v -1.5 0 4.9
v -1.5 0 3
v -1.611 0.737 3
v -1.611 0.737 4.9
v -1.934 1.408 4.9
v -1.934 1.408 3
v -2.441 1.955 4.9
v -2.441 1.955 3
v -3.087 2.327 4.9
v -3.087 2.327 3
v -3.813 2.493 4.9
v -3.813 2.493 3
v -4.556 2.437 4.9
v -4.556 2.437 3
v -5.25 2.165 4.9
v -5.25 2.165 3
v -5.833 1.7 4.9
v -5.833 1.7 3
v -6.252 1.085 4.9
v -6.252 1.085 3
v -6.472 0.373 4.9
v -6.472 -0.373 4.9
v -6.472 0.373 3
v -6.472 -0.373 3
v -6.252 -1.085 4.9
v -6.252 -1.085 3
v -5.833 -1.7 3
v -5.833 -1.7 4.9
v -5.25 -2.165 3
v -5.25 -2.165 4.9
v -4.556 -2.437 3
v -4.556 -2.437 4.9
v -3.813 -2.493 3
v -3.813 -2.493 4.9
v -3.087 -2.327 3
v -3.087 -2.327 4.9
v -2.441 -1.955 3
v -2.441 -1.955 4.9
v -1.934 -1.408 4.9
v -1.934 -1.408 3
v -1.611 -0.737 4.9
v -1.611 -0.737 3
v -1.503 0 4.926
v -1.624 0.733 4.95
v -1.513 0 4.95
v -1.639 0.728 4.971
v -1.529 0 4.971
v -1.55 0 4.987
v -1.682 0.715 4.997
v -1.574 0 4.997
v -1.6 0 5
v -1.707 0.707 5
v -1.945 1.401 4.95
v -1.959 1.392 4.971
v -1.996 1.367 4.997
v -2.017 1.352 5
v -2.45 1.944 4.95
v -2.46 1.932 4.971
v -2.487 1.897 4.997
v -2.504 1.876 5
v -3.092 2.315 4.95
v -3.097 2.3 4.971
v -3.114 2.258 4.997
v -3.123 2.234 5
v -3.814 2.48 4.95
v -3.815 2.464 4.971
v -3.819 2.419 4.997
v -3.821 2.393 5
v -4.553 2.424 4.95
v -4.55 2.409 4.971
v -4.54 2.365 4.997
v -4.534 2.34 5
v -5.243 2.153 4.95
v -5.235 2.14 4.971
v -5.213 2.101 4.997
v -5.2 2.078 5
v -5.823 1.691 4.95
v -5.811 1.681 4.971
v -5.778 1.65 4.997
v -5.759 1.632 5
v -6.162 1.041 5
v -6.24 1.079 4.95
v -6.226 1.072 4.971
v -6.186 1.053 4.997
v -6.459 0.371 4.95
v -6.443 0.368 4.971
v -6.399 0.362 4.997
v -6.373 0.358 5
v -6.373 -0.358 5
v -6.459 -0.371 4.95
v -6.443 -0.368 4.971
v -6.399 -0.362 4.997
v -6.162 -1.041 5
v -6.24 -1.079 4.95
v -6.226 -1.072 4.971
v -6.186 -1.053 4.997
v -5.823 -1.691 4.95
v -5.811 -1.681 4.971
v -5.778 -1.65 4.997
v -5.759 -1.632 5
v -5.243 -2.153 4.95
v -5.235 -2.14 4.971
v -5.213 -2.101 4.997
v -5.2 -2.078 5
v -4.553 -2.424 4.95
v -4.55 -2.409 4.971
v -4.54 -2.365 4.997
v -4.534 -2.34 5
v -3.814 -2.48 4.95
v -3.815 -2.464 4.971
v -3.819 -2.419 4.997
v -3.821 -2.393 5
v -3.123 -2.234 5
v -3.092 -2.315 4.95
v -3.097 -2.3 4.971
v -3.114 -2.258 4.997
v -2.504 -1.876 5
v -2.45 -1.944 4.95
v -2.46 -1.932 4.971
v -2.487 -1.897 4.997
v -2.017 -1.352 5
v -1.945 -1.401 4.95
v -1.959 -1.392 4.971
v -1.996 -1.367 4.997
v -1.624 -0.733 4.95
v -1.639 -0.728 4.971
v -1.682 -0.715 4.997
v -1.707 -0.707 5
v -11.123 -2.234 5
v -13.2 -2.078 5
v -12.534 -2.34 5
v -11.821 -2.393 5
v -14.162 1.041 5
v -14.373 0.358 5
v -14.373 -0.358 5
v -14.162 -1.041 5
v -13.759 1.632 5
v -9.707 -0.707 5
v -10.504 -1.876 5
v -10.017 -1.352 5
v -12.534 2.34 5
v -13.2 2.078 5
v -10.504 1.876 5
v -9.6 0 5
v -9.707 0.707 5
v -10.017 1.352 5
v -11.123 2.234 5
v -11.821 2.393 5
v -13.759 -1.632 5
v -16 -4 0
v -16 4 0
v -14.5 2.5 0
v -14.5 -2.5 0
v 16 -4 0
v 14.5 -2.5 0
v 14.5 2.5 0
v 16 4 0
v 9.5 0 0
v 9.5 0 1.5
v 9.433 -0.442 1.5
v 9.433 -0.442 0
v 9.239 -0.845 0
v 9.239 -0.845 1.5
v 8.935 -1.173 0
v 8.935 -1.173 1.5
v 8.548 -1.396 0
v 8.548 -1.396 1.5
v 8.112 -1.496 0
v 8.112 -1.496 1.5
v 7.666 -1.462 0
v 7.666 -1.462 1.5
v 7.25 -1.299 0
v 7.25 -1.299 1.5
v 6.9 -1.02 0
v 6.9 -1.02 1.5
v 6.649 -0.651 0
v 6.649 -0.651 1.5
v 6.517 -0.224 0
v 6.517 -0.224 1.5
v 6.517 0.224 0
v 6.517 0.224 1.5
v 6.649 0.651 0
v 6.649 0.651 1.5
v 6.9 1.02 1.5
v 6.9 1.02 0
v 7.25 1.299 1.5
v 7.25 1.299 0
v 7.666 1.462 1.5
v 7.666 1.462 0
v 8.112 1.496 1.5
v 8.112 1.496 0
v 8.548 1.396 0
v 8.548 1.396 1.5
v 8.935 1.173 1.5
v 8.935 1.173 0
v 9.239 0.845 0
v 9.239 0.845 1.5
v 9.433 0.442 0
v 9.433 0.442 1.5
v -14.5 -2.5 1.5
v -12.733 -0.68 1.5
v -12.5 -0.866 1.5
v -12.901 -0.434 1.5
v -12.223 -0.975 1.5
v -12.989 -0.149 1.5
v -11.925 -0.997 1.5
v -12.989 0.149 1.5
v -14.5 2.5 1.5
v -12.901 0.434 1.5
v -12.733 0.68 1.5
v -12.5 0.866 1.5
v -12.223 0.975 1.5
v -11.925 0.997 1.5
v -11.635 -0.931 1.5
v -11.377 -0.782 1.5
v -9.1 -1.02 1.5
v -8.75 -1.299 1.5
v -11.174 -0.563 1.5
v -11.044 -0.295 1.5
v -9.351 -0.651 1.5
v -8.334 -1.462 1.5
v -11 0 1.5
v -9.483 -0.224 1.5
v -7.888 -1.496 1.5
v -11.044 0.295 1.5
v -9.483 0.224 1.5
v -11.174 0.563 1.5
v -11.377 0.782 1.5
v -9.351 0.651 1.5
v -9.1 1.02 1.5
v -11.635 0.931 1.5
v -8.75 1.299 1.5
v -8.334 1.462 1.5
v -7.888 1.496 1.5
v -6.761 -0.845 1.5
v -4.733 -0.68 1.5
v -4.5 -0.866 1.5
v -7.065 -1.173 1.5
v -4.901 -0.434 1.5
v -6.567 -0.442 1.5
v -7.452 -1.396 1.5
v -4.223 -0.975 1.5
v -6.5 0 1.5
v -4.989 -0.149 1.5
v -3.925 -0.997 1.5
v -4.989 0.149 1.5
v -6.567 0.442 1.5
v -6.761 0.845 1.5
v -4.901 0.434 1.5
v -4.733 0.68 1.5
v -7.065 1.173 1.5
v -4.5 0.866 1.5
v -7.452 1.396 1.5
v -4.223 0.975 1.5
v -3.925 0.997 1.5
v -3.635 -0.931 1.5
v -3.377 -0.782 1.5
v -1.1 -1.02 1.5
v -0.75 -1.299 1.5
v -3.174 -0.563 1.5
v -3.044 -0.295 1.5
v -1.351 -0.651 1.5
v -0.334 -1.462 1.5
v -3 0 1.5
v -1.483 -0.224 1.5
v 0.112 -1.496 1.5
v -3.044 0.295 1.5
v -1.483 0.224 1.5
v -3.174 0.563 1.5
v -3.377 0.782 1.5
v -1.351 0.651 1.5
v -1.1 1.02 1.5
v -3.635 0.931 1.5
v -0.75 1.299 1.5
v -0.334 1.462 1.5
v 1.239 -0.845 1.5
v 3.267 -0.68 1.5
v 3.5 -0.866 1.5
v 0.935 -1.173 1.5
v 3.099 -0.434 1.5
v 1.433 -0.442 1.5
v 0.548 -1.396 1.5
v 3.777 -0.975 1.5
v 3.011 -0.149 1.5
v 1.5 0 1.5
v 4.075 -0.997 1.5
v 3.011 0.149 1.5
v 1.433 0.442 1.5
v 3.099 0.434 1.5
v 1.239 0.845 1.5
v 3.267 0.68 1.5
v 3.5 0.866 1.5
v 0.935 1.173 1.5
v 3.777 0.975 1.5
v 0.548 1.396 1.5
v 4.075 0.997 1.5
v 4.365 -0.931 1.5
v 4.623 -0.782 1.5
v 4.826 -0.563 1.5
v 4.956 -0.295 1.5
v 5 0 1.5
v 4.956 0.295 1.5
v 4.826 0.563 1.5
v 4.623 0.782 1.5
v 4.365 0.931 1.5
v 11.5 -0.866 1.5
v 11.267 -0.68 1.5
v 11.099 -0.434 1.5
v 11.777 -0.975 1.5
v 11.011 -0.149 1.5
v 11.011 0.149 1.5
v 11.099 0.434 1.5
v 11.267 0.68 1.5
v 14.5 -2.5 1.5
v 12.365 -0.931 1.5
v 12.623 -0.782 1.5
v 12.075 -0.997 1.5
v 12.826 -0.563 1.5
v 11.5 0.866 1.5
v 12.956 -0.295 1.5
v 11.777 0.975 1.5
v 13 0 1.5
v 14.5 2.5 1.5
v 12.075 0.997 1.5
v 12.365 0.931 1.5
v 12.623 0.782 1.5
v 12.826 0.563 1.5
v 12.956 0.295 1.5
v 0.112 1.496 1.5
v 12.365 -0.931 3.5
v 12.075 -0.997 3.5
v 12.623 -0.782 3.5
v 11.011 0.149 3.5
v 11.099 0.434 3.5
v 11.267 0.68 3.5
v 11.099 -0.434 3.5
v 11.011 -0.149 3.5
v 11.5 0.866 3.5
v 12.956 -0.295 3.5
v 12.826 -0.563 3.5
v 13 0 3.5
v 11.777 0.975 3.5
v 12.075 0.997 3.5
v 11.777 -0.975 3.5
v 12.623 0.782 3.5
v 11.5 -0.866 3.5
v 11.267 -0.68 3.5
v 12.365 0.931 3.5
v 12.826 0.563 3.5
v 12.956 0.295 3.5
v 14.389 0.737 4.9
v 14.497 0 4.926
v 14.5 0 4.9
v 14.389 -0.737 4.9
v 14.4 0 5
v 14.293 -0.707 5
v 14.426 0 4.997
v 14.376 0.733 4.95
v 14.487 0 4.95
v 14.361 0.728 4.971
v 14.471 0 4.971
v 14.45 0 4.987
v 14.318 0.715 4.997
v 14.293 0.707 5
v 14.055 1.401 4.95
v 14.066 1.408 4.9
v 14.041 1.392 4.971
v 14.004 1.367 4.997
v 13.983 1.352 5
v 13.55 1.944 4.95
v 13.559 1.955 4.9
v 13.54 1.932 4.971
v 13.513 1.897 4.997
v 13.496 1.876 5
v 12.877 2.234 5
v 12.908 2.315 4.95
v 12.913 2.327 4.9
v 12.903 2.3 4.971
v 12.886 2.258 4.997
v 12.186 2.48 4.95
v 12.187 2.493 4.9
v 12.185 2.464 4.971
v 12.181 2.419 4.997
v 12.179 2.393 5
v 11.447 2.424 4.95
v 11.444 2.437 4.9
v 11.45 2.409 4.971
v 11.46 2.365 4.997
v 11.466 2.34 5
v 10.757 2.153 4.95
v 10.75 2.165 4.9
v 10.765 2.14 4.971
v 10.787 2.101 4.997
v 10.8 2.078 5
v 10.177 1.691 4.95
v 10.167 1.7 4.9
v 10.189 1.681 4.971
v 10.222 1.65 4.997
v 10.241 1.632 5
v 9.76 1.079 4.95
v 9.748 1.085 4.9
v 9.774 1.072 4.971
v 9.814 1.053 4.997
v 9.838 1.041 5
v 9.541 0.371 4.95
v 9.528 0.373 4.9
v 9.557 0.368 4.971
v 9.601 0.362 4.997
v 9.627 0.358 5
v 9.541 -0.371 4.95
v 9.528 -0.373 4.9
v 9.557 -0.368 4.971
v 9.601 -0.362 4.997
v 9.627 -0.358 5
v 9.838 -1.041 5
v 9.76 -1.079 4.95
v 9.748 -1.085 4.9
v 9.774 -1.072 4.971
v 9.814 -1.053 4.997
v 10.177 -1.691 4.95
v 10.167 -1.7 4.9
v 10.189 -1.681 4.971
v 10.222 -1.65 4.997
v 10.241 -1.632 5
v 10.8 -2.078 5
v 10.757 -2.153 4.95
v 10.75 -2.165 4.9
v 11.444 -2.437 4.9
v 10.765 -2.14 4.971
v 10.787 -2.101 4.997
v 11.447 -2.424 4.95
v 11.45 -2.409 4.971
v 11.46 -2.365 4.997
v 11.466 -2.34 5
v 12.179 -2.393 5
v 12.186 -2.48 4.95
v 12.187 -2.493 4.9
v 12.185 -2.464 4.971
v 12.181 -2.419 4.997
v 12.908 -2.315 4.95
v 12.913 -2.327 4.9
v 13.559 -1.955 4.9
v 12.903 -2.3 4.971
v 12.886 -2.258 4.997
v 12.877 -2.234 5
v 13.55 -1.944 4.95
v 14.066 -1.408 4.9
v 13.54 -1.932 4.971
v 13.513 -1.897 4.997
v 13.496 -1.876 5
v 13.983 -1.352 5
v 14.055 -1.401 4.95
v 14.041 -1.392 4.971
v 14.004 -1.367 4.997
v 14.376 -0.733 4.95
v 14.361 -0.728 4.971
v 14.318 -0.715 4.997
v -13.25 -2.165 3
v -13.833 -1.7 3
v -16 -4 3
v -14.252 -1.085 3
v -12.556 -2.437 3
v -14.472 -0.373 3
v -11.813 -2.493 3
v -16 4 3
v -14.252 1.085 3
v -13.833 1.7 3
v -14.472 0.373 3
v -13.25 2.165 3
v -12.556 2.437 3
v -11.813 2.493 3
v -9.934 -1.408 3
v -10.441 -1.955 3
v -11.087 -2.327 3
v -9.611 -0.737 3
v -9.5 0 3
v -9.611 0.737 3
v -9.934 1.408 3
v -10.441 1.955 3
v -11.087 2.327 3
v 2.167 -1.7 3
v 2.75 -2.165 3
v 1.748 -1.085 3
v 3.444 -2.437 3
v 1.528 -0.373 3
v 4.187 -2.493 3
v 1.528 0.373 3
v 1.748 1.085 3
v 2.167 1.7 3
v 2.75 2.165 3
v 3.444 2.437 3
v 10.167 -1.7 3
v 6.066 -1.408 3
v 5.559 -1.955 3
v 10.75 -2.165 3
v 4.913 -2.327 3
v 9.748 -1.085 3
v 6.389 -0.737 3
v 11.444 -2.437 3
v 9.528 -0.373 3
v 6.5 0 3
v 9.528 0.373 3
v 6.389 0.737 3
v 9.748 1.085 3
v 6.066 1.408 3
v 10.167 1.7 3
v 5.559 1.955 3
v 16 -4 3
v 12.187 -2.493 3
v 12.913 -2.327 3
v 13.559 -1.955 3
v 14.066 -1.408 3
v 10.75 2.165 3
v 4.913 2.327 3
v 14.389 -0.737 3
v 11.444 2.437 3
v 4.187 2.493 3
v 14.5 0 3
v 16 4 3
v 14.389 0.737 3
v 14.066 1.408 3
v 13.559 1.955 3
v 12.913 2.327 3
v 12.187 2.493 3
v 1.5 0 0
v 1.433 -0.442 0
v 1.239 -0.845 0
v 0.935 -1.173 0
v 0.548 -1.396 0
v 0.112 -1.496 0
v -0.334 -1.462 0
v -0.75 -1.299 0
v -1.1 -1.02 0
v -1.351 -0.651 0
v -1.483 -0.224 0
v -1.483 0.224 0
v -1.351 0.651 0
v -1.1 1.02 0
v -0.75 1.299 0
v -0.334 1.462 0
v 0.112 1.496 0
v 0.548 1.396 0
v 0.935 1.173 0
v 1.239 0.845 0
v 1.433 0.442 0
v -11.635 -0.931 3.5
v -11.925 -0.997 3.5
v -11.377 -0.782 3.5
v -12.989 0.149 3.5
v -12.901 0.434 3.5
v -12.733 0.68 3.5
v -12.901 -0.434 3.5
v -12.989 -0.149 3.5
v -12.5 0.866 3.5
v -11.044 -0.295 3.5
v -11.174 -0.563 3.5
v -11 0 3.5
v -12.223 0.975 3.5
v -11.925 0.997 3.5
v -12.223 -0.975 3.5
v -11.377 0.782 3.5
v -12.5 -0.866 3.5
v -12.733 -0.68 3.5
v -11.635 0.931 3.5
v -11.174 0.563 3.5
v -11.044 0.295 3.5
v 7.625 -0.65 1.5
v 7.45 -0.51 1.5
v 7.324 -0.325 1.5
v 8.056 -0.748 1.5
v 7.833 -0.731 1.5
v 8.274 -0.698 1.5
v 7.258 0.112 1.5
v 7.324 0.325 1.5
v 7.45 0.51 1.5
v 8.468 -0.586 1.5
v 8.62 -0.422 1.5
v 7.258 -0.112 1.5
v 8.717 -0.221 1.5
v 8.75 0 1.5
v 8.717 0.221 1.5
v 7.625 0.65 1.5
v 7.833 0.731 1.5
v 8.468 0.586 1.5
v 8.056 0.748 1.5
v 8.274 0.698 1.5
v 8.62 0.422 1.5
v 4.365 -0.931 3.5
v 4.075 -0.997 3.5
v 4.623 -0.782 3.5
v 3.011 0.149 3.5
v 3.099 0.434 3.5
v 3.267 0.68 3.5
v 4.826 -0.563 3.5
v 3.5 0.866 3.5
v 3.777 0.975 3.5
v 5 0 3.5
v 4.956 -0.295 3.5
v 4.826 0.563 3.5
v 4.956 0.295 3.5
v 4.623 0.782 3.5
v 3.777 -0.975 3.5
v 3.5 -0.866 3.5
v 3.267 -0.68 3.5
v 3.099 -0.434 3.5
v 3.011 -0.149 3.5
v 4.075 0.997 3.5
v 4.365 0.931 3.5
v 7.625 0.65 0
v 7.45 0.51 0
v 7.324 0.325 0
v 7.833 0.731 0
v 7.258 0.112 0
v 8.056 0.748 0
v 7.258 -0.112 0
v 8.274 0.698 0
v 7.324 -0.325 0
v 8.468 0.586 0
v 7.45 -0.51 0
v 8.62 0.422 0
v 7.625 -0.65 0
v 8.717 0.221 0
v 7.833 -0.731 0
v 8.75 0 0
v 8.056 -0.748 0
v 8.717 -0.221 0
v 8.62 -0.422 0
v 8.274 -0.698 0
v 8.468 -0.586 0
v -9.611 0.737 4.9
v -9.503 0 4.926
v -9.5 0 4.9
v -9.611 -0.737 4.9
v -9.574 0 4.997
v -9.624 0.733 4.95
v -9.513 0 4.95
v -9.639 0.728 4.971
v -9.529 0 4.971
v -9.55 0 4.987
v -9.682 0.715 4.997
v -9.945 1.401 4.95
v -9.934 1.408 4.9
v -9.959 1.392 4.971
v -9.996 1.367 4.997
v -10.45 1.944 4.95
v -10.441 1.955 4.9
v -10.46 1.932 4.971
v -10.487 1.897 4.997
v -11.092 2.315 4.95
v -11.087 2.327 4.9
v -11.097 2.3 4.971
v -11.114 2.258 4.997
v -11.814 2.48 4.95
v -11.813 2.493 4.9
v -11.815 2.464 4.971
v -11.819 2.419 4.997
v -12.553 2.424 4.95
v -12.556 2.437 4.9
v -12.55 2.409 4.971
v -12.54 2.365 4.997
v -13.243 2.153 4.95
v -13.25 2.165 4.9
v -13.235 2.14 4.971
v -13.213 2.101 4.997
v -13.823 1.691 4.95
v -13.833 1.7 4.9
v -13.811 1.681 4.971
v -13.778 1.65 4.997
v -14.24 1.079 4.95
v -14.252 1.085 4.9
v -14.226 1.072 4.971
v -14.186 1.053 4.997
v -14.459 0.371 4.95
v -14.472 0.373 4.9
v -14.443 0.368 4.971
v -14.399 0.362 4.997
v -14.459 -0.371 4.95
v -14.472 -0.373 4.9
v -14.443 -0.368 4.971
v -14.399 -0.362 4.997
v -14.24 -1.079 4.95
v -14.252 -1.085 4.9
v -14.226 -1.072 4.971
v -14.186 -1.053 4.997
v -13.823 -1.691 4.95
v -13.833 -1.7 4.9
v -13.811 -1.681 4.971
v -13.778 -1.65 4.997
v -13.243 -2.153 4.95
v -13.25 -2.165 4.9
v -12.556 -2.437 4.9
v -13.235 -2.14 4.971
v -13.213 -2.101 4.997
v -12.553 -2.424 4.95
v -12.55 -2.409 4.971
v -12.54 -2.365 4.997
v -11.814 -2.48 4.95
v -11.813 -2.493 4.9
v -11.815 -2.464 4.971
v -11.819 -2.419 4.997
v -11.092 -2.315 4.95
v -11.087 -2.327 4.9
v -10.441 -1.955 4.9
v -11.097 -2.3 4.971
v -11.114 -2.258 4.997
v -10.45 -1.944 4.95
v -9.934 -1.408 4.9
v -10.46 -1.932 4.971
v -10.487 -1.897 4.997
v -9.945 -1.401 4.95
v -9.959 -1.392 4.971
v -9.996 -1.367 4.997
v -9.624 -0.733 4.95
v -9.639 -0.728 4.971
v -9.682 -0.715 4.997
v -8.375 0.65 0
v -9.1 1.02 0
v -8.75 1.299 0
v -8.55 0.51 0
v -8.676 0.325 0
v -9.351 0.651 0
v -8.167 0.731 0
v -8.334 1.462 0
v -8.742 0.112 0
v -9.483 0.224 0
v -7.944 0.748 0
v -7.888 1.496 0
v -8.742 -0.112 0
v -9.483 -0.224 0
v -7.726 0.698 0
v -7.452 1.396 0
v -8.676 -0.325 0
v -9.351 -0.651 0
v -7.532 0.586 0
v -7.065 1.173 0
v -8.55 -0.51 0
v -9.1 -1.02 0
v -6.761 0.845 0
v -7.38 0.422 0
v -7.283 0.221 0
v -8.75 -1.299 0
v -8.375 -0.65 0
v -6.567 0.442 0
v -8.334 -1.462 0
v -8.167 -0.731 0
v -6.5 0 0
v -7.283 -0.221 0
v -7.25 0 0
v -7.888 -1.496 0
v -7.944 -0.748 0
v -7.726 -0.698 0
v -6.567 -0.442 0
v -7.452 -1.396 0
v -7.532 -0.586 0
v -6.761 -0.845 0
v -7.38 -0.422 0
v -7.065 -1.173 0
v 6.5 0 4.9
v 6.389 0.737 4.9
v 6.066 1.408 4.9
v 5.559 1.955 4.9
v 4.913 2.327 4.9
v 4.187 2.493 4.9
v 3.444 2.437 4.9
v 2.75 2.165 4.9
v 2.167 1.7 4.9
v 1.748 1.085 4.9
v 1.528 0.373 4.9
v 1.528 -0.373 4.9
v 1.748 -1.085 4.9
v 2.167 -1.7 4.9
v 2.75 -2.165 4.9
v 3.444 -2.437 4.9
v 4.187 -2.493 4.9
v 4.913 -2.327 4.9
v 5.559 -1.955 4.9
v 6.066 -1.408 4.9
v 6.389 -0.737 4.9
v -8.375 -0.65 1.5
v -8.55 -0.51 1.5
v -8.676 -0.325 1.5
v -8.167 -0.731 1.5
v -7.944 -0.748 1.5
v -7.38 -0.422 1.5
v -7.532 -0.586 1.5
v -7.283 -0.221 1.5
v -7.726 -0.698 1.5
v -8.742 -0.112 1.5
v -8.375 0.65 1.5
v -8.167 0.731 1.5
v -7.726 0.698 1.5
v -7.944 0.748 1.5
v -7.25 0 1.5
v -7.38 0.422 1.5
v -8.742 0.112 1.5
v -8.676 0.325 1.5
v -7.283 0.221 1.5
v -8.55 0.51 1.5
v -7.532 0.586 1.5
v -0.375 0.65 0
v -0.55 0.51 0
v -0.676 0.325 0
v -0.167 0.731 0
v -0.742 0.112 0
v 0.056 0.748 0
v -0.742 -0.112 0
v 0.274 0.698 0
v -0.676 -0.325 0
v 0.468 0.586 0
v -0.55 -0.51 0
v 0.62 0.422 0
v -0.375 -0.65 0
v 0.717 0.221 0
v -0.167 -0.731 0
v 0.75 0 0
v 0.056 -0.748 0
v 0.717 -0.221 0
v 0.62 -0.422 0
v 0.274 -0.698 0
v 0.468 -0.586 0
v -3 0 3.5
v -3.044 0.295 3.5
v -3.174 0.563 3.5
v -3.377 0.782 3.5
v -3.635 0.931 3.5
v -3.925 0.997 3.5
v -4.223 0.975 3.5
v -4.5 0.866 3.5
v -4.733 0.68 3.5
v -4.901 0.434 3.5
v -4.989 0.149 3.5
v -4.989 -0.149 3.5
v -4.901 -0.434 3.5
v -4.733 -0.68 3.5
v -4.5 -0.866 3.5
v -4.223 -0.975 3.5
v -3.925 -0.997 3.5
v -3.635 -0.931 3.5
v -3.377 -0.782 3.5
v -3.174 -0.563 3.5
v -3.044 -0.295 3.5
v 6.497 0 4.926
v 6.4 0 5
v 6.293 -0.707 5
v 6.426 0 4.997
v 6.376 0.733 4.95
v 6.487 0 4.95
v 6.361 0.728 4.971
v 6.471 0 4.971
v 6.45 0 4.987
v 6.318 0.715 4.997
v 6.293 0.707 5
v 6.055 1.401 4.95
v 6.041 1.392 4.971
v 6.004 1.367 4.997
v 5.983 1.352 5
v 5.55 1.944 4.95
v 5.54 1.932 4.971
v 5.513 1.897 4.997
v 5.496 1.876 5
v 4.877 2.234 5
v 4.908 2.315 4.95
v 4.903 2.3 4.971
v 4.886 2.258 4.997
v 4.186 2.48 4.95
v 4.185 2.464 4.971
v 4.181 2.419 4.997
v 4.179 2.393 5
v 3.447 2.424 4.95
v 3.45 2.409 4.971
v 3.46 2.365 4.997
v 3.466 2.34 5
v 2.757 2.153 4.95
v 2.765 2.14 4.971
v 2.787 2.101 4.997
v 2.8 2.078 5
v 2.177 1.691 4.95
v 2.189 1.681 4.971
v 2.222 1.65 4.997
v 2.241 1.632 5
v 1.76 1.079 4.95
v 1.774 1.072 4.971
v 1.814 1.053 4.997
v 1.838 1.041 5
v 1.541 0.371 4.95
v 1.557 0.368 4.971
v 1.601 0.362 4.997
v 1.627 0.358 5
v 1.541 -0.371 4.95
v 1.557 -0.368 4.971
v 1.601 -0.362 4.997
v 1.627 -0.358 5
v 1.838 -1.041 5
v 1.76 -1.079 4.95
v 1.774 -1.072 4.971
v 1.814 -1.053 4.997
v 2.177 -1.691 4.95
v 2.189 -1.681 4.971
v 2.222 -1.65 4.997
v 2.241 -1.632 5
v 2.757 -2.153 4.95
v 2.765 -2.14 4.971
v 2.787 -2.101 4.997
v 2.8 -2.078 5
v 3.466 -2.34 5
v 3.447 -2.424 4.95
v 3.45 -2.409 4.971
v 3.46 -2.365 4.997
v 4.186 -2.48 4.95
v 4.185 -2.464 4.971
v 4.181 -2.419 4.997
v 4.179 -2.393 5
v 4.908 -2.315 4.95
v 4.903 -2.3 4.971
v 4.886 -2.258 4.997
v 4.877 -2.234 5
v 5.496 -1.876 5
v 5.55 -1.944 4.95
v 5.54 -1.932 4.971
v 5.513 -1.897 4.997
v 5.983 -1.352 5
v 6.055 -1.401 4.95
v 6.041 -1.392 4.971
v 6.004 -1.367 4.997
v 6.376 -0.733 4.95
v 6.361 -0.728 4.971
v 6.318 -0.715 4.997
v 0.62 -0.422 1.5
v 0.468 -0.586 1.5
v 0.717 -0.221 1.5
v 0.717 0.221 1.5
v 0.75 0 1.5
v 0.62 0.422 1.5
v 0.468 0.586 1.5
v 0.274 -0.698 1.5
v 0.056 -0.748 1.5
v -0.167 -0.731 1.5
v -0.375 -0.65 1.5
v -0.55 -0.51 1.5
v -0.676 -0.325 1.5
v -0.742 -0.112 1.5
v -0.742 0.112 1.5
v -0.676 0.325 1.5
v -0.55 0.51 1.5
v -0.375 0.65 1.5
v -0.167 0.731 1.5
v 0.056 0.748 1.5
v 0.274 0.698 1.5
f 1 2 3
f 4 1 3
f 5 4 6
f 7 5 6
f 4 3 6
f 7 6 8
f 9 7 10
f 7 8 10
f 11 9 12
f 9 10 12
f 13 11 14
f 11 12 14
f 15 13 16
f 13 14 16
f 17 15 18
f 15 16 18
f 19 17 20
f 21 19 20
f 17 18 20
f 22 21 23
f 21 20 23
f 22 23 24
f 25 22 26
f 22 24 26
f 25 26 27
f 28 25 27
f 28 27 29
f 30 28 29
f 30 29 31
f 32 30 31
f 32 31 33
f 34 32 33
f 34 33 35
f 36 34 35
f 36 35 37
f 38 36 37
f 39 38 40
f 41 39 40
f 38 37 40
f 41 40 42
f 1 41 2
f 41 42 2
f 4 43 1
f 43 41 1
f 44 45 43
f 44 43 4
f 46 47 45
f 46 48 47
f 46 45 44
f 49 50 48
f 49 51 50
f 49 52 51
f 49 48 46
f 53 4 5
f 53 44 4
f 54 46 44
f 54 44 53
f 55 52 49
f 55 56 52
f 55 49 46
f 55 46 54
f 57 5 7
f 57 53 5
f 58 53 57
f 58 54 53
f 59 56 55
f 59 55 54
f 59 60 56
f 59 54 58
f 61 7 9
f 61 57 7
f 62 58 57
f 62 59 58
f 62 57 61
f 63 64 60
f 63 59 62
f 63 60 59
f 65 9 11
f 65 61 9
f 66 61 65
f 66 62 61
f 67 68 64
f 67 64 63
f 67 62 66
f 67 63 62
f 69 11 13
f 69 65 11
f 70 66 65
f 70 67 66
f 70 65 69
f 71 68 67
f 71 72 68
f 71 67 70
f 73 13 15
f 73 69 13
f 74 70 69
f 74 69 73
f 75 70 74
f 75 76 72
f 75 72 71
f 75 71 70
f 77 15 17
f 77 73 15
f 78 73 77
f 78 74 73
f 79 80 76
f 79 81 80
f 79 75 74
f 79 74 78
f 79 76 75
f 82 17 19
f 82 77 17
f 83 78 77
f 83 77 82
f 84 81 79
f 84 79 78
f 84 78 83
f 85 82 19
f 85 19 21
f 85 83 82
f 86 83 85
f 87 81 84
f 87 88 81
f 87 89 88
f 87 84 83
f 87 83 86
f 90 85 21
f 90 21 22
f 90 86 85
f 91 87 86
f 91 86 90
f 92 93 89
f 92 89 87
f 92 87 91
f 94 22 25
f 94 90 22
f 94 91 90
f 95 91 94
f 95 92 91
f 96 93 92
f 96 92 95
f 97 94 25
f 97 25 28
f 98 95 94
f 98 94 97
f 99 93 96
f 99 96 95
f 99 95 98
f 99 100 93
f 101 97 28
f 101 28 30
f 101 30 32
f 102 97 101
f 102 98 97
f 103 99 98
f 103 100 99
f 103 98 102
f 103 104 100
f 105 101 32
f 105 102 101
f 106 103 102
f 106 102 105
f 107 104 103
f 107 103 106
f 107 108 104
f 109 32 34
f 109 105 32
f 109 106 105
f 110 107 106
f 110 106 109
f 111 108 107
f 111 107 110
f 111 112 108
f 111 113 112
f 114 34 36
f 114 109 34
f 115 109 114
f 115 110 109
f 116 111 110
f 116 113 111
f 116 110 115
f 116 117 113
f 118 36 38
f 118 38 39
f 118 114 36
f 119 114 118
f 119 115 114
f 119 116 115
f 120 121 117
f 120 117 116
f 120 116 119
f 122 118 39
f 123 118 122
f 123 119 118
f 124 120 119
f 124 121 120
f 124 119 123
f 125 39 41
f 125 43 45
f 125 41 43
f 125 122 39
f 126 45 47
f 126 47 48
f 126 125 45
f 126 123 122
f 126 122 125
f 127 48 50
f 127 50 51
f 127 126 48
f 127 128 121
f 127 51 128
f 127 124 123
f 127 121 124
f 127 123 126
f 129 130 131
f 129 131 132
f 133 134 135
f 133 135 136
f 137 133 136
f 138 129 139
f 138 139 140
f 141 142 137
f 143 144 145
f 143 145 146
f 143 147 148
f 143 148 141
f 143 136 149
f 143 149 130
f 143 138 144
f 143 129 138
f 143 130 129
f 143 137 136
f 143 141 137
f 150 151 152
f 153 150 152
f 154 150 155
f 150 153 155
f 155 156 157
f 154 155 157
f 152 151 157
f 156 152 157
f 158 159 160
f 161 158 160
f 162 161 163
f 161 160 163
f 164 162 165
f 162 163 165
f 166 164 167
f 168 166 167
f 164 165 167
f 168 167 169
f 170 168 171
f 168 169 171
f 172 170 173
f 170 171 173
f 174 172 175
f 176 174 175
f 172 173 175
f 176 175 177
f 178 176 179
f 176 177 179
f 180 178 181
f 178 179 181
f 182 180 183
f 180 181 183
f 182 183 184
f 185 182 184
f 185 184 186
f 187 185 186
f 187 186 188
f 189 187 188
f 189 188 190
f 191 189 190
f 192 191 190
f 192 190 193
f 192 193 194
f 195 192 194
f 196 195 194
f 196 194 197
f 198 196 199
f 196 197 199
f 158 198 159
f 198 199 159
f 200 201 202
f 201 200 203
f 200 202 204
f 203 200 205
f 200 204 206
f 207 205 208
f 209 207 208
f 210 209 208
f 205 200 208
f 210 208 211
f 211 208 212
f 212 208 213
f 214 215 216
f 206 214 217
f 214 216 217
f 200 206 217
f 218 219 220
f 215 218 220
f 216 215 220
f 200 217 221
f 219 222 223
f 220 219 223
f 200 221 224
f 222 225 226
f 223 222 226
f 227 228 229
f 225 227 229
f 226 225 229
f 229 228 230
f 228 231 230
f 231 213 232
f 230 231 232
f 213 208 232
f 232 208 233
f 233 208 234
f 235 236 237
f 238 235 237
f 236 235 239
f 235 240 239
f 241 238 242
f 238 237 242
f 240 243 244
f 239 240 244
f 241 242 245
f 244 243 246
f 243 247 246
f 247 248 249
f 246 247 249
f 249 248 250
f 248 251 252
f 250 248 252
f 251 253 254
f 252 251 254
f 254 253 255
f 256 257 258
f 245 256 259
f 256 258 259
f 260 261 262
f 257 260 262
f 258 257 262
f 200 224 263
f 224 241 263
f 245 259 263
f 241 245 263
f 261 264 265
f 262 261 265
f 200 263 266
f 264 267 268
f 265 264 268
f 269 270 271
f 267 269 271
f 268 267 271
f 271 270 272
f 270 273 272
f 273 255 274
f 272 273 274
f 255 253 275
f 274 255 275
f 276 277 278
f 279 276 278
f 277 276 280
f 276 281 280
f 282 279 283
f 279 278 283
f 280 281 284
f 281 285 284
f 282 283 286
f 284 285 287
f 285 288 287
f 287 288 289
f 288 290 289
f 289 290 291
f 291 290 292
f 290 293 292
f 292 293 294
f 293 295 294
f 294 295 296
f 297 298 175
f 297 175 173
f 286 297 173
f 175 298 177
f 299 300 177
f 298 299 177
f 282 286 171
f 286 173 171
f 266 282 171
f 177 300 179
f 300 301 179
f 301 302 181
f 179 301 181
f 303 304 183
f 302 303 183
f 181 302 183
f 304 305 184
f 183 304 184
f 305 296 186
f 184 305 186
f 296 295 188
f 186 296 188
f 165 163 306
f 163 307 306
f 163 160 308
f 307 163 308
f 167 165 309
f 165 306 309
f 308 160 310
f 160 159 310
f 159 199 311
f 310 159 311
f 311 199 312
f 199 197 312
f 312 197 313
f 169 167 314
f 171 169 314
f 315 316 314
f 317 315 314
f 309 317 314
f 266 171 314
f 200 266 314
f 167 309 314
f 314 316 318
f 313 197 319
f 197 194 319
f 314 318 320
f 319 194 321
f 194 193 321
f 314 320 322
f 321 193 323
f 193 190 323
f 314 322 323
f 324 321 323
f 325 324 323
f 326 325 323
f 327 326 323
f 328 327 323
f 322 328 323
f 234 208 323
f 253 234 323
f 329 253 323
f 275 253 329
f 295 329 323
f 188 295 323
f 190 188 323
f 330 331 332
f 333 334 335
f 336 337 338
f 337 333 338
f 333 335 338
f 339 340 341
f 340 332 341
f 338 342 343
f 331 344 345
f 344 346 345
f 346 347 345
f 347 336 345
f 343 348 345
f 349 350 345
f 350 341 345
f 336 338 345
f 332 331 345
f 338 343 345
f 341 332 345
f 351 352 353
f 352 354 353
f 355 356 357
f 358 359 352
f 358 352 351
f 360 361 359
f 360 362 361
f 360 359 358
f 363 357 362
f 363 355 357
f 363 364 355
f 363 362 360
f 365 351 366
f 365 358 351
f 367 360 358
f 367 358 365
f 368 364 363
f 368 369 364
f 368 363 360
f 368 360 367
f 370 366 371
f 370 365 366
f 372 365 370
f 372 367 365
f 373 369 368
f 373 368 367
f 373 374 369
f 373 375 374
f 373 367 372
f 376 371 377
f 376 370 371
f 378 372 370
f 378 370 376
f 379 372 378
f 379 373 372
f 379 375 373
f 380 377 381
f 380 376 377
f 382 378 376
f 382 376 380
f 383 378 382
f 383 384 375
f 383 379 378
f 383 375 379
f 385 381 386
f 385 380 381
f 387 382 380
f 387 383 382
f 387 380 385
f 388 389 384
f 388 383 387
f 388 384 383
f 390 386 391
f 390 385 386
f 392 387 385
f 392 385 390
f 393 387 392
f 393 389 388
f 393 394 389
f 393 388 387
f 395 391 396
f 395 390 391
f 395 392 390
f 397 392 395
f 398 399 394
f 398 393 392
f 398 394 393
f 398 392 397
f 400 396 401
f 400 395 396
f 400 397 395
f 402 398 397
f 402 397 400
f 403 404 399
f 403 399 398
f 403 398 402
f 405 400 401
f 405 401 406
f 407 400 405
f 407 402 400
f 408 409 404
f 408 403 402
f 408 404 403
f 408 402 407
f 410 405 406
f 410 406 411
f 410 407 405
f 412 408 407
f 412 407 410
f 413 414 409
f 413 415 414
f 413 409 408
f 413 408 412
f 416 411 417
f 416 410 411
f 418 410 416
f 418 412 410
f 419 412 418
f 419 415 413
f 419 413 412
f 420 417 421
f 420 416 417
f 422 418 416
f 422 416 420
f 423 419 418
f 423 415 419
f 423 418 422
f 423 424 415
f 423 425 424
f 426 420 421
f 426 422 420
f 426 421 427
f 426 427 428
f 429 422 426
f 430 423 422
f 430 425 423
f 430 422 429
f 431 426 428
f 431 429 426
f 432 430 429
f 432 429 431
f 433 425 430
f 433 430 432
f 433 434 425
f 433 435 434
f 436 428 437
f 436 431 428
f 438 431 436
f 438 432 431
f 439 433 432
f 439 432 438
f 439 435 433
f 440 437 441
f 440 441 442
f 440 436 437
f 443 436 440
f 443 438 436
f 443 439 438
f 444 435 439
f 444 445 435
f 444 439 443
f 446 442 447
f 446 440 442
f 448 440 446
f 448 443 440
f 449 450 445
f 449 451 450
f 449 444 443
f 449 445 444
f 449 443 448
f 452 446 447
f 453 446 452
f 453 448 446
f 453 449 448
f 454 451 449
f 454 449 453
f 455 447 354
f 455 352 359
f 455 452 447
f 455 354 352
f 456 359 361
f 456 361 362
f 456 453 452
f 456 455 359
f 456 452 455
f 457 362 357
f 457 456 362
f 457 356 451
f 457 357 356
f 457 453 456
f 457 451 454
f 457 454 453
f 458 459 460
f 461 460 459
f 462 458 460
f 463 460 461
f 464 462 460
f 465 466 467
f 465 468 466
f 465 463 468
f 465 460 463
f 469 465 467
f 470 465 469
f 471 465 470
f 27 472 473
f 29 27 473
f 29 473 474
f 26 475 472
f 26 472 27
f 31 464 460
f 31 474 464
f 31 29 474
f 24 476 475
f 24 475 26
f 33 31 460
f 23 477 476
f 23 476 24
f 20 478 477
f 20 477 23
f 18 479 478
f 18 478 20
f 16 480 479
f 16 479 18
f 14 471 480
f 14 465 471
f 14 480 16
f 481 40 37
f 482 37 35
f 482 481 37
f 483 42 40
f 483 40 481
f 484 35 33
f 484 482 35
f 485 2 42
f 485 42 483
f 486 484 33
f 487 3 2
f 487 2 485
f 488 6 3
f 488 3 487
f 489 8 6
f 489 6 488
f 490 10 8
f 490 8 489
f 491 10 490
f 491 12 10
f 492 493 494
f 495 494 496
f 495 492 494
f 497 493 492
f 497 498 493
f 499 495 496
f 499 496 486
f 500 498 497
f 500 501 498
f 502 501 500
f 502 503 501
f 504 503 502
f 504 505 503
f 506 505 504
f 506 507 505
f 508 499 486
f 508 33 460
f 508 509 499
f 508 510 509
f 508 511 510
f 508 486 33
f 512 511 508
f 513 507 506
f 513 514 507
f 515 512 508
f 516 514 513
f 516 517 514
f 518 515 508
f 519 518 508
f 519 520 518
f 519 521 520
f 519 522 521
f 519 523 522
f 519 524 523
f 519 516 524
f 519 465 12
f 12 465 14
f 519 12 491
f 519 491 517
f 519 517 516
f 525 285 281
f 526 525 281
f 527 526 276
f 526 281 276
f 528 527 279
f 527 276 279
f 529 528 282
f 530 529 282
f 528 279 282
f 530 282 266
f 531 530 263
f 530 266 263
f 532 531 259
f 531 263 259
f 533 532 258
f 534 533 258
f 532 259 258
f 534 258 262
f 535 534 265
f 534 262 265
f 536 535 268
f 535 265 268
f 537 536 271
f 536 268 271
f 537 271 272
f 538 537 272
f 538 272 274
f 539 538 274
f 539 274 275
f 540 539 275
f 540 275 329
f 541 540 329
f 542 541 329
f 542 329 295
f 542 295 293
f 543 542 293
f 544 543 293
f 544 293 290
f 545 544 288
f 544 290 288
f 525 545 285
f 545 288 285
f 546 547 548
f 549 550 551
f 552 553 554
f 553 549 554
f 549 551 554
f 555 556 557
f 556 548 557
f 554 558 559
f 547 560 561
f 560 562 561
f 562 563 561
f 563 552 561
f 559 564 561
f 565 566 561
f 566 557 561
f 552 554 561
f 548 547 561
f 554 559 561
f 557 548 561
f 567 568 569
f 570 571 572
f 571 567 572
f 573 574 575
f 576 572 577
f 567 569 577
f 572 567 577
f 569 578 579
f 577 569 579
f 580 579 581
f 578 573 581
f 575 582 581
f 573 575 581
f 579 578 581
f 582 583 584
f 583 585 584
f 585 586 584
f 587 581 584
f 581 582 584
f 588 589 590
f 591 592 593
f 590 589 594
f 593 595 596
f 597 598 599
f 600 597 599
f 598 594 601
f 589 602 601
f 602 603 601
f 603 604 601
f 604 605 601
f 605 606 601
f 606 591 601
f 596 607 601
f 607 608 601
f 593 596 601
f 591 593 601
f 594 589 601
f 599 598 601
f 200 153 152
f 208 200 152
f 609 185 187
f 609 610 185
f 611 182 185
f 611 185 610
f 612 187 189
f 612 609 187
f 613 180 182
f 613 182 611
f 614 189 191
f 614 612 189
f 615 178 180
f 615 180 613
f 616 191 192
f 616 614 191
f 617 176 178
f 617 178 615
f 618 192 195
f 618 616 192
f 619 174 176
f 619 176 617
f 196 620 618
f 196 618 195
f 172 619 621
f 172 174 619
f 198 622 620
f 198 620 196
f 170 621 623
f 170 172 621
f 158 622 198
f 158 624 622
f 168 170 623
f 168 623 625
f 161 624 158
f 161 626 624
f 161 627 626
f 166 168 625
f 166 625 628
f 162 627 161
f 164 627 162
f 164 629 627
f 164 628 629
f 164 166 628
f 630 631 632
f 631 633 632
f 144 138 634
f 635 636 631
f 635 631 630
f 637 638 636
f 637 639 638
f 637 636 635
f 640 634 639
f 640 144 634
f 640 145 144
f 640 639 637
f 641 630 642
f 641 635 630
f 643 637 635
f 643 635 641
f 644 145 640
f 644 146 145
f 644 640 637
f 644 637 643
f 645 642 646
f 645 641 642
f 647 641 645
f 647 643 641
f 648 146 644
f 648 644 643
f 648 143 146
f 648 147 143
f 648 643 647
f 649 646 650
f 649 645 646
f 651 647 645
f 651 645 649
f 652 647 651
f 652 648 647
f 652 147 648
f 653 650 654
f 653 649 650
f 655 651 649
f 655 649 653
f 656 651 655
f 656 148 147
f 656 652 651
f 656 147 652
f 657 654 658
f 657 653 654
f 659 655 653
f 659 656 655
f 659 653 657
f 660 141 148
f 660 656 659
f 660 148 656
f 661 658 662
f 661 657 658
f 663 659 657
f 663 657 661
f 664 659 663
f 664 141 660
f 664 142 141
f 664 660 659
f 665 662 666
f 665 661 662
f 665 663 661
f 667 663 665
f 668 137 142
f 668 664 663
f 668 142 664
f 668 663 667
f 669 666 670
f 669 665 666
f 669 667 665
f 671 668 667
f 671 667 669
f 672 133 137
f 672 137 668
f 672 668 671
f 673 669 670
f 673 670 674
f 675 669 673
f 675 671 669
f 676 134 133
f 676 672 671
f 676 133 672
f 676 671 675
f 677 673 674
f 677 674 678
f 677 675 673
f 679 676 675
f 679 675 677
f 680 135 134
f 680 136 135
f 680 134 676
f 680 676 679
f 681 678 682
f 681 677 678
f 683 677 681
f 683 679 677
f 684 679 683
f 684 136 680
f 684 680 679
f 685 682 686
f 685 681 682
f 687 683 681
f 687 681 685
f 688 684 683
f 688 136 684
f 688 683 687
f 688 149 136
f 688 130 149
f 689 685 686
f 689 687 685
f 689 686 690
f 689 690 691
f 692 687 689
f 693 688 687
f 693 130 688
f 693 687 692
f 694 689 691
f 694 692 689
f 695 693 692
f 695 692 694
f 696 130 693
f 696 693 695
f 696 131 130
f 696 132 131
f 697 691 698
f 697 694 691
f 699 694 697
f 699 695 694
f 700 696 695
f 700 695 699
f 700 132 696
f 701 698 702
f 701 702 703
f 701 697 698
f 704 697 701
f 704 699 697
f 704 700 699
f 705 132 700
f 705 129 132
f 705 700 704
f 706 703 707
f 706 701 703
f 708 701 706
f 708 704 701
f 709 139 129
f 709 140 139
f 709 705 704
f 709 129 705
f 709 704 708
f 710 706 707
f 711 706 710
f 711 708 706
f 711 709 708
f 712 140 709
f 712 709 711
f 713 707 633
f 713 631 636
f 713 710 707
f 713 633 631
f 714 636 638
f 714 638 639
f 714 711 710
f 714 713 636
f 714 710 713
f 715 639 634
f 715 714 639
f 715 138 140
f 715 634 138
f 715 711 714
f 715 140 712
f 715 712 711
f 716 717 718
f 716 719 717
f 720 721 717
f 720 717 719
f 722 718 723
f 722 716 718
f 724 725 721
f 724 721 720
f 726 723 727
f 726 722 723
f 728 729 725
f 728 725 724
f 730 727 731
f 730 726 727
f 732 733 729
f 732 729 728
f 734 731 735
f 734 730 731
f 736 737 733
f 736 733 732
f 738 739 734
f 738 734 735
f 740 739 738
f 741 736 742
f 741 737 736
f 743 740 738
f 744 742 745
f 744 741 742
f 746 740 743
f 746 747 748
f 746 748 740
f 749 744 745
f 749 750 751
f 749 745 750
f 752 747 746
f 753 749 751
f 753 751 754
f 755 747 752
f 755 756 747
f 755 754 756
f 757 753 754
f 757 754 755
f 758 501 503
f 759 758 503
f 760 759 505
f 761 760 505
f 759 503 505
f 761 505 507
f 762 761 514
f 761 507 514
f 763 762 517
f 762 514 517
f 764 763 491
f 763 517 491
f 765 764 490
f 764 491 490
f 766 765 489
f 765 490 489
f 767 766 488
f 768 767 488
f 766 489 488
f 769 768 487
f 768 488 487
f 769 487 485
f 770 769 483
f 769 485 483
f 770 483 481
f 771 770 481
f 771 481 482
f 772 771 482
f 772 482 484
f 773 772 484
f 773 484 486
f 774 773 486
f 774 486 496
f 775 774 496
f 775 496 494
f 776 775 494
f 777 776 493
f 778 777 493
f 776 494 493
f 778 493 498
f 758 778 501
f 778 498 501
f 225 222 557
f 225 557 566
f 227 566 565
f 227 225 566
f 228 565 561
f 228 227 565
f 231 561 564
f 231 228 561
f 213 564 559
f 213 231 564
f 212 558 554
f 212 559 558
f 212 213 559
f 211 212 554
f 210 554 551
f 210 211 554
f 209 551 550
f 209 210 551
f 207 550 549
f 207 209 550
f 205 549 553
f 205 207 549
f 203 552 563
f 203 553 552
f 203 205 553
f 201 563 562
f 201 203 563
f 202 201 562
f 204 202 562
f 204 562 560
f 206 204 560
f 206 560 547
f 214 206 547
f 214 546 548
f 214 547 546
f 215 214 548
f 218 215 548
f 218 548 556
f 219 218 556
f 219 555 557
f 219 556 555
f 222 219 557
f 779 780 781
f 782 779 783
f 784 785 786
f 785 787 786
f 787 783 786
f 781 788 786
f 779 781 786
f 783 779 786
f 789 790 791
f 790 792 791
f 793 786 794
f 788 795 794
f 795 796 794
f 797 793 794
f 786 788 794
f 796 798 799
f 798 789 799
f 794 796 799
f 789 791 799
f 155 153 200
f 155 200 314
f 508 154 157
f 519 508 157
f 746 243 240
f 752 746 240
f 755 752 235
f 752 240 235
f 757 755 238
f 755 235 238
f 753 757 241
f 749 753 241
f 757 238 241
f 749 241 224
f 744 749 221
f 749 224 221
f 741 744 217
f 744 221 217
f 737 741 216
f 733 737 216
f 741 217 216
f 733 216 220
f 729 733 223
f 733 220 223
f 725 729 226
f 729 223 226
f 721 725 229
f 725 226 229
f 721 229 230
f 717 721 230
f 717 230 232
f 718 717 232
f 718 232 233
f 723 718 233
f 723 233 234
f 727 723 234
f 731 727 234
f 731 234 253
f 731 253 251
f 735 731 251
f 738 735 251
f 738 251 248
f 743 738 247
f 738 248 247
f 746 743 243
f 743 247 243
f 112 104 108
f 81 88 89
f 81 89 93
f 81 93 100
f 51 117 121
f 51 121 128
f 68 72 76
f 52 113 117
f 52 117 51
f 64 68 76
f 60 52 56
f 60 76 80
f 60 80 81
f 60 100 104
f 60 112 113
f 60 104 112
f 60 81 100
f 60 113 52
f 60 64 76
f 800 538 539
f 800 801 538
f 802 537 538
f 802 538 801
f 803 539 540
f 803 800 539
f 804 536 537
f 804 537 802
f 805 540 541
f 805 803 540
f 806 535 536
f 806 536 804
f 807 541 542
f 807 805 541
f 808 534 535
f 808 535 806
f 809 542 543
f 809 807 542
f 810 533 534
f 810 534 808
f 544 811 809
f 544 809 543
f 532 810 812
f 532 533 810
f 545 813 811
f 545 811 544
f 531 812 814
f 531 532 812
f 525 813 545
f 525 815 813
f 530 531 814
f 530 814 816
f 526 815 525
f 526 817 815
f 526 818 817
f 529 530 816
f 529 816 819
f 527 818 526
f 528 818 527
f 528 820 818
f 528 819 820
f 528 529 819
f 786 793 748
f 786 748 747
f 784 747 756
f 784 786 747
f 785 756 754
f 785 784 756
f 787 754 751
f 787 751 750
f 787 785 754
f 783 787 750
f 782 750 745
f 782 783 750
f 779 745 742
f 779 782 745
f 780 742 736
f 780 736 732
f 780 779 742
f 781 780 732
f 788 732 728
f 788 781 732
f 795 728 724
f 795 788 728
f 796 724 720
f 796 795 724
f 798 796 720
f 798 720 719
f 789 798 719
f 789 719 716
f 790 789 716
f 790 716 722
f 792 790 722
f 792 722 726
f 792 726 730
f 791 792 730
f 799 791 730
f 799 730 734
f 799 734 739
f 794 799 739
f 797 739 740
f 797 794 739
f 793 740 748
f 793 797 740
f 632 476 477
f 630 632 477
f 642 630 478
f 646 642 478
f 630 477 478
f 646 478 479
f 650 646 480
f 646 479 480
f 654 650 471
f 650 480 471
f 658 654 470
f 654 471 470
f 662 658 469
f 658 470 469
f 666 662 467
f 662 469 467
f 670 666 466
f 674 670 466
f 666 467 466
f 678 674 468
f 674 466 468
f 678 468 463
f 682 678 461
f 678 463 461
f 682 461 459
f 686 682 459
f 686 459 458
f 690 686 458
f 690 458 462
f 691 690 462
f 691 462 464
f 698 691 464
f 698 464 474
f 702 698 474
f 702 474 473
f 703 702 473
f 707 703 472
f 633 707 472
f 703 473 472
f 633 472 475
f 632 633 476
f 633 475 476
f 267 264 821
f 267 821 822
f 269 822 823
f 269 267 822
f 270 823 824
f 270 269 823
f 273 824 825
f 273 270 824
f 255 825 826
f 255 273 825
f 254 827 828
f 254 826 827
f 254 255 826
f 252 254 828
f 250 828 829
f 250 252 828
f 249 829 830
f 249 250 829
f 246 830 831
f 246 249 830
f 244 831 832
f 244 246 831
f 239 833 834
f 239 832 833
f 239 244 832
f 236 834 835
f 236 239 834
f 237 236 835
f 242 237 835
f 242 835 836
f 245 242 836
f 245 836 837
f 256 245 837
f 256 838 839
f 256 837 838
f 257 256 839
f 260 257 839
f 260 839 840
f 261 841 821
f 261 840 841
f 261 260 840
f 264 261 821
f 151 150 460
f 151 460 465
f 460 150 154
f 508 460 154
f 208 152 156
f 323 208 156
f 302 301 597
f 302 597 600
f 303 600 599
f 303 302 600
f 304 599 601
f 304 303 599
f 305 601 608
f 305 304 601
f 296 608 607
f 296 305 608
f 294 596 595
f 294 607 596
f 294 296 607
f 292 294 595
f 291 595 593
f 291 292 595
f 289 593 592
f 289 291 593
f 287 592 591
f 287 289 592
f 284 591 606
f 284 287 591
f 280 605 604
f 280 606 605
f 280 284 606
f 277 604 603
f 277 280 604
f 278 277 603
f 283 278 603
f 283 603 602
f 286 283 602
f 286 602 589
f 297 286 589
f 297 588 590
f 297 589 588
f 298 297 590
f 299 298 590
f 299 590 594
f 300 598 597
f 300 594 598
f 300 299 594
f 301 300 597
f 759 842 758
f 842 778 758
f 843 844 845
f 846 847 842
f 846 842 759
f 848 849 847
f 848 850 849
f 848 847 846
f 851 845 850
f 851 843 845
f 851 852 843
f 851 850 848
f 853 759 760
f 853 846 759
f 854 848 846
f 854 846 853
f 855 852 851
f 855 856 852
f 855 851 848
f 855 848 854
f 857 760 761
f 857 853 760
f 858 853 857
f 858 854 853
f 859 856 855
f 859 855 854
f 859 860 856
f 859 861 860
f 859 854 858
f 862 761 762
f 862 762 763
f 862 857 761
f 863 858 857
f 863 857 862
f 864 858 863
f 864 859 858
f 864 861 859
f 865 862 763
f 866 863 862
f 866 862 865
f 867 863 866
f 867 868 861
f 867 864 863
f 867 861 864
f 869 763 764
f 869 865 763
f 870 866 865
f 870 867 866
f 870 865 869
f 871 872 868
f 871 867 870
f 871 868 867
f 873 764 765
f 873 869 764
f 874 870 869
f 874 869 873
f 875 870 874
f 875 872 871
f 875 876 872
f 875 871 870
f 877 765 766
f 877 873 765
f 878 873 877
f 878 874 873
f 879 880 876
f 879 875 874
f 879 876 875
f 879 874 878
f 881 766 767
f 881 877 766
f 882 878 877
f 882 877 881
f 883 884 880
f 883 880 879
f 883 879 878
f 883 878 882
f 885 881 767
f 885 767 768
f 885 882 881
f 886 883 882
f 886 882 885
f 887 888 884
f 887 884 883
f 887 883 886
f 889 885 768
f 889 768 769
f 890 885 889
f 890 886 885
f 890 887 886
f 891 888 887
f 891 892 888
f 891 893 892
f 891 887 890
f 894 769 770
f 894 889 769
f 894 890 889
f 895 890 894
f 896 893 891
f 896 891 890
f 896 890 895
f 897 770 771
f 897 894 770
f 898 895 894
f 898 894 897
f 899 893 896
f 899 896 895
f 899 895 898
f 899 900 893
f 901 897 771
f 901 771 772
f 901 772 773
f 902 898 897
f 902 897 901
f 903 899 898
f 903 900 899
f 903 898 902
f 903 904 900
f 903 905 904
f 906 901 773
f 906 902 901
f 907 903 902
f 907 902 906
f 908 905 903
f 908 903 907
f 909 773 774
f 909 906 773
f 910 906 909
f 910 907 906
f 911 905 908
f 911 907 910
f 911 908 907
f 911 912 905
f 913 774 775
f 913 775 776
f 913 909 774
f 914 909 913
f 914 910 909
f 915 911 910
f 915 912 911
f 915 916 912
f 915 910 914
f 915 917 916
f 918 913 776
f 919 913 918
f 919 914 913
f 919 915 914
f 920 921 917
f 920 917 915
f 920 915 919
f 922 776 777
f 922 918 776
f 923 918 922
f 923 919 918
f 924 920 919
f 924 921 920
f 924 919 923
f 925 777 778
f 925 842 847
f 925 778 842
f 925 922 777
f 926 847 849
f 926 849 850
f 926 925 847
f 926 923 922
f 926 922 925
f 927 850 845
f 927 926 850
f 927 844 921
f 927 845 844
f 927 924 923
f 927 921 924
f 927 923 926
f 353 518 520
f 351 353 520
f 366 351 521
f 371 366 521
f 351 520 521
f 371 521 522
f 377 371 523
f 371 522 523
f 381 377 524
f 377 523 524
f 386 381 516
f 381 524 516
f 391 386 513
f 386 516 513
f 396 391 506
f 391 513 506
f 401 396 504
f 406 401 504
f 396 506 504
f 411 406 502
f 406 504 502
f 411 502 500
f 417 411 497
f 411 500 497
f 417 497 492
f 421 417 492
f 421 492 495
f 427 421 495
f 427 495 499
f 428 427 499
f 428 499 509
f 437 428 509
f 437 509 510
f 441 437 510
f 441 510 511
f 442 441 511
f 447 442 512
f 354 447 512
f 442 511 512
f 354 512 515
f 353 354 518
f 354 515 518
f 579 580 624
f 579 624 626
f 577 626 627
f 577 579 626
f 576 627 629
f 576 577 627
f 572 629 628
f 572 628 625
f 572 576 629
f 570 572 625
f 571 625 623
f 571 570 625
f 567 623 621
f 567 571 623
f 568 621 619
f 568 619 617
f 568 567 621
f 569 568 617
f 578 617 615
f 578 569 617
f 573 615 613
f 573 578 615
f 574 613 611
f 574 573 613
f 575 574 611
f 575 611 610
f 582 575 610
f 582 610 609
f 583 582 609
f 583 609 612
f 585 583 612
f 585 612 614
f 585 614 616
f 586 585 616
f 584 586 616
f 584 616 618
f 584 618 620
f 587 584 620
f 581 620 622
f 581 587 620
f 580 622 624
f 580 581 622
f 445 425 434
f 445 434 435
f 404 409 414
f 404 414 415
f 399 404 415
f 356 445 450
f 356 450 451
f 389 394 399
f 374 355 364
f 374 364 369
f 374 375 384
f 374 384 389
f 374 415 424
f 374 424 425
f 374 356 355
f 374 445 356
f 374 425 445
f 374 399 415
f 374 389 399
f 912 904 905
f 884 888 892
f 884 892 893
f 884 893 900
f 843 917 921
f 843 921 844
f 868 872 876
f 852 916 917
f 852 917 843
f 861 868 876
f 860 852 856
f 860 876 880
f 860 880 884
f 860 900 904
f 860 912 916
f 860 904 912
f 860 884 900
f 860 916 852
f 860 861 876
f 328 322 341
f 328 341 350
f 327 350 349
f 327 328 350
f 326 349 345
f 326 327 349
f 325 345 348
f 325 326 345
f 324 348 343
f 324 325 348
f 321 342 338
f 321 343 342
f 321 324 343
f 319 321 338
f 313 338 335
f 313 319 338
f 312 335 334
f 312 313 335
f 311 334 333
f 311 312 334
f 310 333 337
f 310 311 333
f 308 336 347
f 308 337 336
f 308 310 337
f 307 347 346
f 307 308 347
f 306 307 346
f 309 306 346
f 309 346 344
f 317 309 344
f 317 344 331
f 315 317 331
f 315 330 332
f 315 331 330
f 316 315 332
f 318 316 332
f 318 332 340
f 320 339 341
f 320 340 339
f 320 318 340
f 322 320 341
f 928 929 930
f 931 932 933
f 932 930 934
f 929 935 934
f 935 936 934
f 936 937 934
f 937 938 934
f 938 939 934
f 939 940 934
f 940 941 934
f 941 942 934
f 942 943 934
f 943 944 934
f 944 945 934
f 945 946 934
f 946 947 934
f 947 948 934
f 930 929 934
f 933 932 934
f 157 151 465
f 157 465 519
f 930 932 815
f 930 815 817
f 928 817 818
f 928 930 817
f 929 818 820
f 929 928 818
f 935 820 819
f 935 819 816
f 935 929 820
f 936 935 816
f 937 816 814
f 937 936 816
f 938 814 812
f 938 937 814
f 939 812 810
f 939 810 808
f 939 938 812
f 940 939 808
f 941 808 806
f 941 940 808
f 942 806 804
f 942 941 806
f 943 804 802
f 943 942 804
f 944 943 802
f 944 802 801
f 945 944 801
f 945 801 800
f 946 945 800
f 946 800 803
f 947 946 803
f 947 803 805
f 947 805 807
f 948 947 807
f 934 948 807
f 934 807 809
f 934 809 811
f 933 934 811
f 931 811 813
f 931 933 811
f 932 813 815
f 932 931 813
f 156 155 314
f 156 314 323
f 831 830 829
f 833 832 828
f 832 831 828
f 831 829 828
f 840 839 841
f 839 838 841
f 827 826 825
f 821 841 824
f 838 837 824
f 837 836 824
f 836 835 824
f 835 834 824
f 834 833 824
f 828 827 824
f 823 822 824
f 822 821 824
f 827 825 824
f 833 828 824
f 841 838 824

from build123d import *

# Parameters (mm, degrees)
F0_W     = 32
F0_H     = 8
F1_DEPTH = 3
F2_R     = 2.5
F3_DEPTH = 2
F4_R     = 0.1
F5_T     = -1.5
F6_R     = 1.5
F6_R_2   = 0.75
F7_DEPTH = 1.5


# Not quite as in the source:
# - a feature names something its author has since deleted; it is built from what else it names


with BuildPart() as f1:
    # F0 (on Top) → F1 (new body)
    with BuildSketch(Plane.XY):
        Rectangle(F0_W, F0_H)
    extrude(amount=F1_DEPTH)

    # F2 (on face) → F3 (join)
    with BuildSketch(Plane.XY.offset(3)):
        with Locations((-12, 0)):
            Circle(F2_R)
        with Locations((-4, 0)):
            Circle(F2_R)
        with Locations((4, 0)):
            Circle(F2_R)
        with Locations((12, 0)):
            Circle(F2_R)
    extrude(amount=F3_DEPTH)

    # F4
    f4_edges = [f1.edges().sort_by_distance(p)[0] for p in [
        (-14.5, 0, 5),
        (-6.5, 0, 5),
        (1.5, 0, 5),
        (9.5, 0, 5),
    ]]
    fillet(f4_edges, radius=F4_R)

    # F5
    f5_openings = [f1.faces().sort_by_distance(p)[0] for p in [
        (0, 0, 0),
    ]]
    offset(amount=F5_T, openings=f5_openings, kind=Kind.INTERSECTION)

    # F6 (on face) → F7 (join, through all)
    with BuildSketch(Plane(origin=(0, 0, 1.5), x_dir=(1, 0, 0), z_dir=(0, 0, -1))):
        with Locations((-8, 0)):
            Circle(F6_R)
        with Locations((-8, 0)):
            Circle(F6_R_2, mode=Mode.SUBTRACT)
        Circle(F6_R)
        Circle(F6_R_2, mode=Mode.SUBTRACT)
        with Locations((8, 0)):
            Circle(F6_R)
        with Locations((8, 0)):
            Circle(F6_R_2, mode=Mode.SUBTRACT)
    extrude(amount=F7_DEPTH)


solid = f1.part
